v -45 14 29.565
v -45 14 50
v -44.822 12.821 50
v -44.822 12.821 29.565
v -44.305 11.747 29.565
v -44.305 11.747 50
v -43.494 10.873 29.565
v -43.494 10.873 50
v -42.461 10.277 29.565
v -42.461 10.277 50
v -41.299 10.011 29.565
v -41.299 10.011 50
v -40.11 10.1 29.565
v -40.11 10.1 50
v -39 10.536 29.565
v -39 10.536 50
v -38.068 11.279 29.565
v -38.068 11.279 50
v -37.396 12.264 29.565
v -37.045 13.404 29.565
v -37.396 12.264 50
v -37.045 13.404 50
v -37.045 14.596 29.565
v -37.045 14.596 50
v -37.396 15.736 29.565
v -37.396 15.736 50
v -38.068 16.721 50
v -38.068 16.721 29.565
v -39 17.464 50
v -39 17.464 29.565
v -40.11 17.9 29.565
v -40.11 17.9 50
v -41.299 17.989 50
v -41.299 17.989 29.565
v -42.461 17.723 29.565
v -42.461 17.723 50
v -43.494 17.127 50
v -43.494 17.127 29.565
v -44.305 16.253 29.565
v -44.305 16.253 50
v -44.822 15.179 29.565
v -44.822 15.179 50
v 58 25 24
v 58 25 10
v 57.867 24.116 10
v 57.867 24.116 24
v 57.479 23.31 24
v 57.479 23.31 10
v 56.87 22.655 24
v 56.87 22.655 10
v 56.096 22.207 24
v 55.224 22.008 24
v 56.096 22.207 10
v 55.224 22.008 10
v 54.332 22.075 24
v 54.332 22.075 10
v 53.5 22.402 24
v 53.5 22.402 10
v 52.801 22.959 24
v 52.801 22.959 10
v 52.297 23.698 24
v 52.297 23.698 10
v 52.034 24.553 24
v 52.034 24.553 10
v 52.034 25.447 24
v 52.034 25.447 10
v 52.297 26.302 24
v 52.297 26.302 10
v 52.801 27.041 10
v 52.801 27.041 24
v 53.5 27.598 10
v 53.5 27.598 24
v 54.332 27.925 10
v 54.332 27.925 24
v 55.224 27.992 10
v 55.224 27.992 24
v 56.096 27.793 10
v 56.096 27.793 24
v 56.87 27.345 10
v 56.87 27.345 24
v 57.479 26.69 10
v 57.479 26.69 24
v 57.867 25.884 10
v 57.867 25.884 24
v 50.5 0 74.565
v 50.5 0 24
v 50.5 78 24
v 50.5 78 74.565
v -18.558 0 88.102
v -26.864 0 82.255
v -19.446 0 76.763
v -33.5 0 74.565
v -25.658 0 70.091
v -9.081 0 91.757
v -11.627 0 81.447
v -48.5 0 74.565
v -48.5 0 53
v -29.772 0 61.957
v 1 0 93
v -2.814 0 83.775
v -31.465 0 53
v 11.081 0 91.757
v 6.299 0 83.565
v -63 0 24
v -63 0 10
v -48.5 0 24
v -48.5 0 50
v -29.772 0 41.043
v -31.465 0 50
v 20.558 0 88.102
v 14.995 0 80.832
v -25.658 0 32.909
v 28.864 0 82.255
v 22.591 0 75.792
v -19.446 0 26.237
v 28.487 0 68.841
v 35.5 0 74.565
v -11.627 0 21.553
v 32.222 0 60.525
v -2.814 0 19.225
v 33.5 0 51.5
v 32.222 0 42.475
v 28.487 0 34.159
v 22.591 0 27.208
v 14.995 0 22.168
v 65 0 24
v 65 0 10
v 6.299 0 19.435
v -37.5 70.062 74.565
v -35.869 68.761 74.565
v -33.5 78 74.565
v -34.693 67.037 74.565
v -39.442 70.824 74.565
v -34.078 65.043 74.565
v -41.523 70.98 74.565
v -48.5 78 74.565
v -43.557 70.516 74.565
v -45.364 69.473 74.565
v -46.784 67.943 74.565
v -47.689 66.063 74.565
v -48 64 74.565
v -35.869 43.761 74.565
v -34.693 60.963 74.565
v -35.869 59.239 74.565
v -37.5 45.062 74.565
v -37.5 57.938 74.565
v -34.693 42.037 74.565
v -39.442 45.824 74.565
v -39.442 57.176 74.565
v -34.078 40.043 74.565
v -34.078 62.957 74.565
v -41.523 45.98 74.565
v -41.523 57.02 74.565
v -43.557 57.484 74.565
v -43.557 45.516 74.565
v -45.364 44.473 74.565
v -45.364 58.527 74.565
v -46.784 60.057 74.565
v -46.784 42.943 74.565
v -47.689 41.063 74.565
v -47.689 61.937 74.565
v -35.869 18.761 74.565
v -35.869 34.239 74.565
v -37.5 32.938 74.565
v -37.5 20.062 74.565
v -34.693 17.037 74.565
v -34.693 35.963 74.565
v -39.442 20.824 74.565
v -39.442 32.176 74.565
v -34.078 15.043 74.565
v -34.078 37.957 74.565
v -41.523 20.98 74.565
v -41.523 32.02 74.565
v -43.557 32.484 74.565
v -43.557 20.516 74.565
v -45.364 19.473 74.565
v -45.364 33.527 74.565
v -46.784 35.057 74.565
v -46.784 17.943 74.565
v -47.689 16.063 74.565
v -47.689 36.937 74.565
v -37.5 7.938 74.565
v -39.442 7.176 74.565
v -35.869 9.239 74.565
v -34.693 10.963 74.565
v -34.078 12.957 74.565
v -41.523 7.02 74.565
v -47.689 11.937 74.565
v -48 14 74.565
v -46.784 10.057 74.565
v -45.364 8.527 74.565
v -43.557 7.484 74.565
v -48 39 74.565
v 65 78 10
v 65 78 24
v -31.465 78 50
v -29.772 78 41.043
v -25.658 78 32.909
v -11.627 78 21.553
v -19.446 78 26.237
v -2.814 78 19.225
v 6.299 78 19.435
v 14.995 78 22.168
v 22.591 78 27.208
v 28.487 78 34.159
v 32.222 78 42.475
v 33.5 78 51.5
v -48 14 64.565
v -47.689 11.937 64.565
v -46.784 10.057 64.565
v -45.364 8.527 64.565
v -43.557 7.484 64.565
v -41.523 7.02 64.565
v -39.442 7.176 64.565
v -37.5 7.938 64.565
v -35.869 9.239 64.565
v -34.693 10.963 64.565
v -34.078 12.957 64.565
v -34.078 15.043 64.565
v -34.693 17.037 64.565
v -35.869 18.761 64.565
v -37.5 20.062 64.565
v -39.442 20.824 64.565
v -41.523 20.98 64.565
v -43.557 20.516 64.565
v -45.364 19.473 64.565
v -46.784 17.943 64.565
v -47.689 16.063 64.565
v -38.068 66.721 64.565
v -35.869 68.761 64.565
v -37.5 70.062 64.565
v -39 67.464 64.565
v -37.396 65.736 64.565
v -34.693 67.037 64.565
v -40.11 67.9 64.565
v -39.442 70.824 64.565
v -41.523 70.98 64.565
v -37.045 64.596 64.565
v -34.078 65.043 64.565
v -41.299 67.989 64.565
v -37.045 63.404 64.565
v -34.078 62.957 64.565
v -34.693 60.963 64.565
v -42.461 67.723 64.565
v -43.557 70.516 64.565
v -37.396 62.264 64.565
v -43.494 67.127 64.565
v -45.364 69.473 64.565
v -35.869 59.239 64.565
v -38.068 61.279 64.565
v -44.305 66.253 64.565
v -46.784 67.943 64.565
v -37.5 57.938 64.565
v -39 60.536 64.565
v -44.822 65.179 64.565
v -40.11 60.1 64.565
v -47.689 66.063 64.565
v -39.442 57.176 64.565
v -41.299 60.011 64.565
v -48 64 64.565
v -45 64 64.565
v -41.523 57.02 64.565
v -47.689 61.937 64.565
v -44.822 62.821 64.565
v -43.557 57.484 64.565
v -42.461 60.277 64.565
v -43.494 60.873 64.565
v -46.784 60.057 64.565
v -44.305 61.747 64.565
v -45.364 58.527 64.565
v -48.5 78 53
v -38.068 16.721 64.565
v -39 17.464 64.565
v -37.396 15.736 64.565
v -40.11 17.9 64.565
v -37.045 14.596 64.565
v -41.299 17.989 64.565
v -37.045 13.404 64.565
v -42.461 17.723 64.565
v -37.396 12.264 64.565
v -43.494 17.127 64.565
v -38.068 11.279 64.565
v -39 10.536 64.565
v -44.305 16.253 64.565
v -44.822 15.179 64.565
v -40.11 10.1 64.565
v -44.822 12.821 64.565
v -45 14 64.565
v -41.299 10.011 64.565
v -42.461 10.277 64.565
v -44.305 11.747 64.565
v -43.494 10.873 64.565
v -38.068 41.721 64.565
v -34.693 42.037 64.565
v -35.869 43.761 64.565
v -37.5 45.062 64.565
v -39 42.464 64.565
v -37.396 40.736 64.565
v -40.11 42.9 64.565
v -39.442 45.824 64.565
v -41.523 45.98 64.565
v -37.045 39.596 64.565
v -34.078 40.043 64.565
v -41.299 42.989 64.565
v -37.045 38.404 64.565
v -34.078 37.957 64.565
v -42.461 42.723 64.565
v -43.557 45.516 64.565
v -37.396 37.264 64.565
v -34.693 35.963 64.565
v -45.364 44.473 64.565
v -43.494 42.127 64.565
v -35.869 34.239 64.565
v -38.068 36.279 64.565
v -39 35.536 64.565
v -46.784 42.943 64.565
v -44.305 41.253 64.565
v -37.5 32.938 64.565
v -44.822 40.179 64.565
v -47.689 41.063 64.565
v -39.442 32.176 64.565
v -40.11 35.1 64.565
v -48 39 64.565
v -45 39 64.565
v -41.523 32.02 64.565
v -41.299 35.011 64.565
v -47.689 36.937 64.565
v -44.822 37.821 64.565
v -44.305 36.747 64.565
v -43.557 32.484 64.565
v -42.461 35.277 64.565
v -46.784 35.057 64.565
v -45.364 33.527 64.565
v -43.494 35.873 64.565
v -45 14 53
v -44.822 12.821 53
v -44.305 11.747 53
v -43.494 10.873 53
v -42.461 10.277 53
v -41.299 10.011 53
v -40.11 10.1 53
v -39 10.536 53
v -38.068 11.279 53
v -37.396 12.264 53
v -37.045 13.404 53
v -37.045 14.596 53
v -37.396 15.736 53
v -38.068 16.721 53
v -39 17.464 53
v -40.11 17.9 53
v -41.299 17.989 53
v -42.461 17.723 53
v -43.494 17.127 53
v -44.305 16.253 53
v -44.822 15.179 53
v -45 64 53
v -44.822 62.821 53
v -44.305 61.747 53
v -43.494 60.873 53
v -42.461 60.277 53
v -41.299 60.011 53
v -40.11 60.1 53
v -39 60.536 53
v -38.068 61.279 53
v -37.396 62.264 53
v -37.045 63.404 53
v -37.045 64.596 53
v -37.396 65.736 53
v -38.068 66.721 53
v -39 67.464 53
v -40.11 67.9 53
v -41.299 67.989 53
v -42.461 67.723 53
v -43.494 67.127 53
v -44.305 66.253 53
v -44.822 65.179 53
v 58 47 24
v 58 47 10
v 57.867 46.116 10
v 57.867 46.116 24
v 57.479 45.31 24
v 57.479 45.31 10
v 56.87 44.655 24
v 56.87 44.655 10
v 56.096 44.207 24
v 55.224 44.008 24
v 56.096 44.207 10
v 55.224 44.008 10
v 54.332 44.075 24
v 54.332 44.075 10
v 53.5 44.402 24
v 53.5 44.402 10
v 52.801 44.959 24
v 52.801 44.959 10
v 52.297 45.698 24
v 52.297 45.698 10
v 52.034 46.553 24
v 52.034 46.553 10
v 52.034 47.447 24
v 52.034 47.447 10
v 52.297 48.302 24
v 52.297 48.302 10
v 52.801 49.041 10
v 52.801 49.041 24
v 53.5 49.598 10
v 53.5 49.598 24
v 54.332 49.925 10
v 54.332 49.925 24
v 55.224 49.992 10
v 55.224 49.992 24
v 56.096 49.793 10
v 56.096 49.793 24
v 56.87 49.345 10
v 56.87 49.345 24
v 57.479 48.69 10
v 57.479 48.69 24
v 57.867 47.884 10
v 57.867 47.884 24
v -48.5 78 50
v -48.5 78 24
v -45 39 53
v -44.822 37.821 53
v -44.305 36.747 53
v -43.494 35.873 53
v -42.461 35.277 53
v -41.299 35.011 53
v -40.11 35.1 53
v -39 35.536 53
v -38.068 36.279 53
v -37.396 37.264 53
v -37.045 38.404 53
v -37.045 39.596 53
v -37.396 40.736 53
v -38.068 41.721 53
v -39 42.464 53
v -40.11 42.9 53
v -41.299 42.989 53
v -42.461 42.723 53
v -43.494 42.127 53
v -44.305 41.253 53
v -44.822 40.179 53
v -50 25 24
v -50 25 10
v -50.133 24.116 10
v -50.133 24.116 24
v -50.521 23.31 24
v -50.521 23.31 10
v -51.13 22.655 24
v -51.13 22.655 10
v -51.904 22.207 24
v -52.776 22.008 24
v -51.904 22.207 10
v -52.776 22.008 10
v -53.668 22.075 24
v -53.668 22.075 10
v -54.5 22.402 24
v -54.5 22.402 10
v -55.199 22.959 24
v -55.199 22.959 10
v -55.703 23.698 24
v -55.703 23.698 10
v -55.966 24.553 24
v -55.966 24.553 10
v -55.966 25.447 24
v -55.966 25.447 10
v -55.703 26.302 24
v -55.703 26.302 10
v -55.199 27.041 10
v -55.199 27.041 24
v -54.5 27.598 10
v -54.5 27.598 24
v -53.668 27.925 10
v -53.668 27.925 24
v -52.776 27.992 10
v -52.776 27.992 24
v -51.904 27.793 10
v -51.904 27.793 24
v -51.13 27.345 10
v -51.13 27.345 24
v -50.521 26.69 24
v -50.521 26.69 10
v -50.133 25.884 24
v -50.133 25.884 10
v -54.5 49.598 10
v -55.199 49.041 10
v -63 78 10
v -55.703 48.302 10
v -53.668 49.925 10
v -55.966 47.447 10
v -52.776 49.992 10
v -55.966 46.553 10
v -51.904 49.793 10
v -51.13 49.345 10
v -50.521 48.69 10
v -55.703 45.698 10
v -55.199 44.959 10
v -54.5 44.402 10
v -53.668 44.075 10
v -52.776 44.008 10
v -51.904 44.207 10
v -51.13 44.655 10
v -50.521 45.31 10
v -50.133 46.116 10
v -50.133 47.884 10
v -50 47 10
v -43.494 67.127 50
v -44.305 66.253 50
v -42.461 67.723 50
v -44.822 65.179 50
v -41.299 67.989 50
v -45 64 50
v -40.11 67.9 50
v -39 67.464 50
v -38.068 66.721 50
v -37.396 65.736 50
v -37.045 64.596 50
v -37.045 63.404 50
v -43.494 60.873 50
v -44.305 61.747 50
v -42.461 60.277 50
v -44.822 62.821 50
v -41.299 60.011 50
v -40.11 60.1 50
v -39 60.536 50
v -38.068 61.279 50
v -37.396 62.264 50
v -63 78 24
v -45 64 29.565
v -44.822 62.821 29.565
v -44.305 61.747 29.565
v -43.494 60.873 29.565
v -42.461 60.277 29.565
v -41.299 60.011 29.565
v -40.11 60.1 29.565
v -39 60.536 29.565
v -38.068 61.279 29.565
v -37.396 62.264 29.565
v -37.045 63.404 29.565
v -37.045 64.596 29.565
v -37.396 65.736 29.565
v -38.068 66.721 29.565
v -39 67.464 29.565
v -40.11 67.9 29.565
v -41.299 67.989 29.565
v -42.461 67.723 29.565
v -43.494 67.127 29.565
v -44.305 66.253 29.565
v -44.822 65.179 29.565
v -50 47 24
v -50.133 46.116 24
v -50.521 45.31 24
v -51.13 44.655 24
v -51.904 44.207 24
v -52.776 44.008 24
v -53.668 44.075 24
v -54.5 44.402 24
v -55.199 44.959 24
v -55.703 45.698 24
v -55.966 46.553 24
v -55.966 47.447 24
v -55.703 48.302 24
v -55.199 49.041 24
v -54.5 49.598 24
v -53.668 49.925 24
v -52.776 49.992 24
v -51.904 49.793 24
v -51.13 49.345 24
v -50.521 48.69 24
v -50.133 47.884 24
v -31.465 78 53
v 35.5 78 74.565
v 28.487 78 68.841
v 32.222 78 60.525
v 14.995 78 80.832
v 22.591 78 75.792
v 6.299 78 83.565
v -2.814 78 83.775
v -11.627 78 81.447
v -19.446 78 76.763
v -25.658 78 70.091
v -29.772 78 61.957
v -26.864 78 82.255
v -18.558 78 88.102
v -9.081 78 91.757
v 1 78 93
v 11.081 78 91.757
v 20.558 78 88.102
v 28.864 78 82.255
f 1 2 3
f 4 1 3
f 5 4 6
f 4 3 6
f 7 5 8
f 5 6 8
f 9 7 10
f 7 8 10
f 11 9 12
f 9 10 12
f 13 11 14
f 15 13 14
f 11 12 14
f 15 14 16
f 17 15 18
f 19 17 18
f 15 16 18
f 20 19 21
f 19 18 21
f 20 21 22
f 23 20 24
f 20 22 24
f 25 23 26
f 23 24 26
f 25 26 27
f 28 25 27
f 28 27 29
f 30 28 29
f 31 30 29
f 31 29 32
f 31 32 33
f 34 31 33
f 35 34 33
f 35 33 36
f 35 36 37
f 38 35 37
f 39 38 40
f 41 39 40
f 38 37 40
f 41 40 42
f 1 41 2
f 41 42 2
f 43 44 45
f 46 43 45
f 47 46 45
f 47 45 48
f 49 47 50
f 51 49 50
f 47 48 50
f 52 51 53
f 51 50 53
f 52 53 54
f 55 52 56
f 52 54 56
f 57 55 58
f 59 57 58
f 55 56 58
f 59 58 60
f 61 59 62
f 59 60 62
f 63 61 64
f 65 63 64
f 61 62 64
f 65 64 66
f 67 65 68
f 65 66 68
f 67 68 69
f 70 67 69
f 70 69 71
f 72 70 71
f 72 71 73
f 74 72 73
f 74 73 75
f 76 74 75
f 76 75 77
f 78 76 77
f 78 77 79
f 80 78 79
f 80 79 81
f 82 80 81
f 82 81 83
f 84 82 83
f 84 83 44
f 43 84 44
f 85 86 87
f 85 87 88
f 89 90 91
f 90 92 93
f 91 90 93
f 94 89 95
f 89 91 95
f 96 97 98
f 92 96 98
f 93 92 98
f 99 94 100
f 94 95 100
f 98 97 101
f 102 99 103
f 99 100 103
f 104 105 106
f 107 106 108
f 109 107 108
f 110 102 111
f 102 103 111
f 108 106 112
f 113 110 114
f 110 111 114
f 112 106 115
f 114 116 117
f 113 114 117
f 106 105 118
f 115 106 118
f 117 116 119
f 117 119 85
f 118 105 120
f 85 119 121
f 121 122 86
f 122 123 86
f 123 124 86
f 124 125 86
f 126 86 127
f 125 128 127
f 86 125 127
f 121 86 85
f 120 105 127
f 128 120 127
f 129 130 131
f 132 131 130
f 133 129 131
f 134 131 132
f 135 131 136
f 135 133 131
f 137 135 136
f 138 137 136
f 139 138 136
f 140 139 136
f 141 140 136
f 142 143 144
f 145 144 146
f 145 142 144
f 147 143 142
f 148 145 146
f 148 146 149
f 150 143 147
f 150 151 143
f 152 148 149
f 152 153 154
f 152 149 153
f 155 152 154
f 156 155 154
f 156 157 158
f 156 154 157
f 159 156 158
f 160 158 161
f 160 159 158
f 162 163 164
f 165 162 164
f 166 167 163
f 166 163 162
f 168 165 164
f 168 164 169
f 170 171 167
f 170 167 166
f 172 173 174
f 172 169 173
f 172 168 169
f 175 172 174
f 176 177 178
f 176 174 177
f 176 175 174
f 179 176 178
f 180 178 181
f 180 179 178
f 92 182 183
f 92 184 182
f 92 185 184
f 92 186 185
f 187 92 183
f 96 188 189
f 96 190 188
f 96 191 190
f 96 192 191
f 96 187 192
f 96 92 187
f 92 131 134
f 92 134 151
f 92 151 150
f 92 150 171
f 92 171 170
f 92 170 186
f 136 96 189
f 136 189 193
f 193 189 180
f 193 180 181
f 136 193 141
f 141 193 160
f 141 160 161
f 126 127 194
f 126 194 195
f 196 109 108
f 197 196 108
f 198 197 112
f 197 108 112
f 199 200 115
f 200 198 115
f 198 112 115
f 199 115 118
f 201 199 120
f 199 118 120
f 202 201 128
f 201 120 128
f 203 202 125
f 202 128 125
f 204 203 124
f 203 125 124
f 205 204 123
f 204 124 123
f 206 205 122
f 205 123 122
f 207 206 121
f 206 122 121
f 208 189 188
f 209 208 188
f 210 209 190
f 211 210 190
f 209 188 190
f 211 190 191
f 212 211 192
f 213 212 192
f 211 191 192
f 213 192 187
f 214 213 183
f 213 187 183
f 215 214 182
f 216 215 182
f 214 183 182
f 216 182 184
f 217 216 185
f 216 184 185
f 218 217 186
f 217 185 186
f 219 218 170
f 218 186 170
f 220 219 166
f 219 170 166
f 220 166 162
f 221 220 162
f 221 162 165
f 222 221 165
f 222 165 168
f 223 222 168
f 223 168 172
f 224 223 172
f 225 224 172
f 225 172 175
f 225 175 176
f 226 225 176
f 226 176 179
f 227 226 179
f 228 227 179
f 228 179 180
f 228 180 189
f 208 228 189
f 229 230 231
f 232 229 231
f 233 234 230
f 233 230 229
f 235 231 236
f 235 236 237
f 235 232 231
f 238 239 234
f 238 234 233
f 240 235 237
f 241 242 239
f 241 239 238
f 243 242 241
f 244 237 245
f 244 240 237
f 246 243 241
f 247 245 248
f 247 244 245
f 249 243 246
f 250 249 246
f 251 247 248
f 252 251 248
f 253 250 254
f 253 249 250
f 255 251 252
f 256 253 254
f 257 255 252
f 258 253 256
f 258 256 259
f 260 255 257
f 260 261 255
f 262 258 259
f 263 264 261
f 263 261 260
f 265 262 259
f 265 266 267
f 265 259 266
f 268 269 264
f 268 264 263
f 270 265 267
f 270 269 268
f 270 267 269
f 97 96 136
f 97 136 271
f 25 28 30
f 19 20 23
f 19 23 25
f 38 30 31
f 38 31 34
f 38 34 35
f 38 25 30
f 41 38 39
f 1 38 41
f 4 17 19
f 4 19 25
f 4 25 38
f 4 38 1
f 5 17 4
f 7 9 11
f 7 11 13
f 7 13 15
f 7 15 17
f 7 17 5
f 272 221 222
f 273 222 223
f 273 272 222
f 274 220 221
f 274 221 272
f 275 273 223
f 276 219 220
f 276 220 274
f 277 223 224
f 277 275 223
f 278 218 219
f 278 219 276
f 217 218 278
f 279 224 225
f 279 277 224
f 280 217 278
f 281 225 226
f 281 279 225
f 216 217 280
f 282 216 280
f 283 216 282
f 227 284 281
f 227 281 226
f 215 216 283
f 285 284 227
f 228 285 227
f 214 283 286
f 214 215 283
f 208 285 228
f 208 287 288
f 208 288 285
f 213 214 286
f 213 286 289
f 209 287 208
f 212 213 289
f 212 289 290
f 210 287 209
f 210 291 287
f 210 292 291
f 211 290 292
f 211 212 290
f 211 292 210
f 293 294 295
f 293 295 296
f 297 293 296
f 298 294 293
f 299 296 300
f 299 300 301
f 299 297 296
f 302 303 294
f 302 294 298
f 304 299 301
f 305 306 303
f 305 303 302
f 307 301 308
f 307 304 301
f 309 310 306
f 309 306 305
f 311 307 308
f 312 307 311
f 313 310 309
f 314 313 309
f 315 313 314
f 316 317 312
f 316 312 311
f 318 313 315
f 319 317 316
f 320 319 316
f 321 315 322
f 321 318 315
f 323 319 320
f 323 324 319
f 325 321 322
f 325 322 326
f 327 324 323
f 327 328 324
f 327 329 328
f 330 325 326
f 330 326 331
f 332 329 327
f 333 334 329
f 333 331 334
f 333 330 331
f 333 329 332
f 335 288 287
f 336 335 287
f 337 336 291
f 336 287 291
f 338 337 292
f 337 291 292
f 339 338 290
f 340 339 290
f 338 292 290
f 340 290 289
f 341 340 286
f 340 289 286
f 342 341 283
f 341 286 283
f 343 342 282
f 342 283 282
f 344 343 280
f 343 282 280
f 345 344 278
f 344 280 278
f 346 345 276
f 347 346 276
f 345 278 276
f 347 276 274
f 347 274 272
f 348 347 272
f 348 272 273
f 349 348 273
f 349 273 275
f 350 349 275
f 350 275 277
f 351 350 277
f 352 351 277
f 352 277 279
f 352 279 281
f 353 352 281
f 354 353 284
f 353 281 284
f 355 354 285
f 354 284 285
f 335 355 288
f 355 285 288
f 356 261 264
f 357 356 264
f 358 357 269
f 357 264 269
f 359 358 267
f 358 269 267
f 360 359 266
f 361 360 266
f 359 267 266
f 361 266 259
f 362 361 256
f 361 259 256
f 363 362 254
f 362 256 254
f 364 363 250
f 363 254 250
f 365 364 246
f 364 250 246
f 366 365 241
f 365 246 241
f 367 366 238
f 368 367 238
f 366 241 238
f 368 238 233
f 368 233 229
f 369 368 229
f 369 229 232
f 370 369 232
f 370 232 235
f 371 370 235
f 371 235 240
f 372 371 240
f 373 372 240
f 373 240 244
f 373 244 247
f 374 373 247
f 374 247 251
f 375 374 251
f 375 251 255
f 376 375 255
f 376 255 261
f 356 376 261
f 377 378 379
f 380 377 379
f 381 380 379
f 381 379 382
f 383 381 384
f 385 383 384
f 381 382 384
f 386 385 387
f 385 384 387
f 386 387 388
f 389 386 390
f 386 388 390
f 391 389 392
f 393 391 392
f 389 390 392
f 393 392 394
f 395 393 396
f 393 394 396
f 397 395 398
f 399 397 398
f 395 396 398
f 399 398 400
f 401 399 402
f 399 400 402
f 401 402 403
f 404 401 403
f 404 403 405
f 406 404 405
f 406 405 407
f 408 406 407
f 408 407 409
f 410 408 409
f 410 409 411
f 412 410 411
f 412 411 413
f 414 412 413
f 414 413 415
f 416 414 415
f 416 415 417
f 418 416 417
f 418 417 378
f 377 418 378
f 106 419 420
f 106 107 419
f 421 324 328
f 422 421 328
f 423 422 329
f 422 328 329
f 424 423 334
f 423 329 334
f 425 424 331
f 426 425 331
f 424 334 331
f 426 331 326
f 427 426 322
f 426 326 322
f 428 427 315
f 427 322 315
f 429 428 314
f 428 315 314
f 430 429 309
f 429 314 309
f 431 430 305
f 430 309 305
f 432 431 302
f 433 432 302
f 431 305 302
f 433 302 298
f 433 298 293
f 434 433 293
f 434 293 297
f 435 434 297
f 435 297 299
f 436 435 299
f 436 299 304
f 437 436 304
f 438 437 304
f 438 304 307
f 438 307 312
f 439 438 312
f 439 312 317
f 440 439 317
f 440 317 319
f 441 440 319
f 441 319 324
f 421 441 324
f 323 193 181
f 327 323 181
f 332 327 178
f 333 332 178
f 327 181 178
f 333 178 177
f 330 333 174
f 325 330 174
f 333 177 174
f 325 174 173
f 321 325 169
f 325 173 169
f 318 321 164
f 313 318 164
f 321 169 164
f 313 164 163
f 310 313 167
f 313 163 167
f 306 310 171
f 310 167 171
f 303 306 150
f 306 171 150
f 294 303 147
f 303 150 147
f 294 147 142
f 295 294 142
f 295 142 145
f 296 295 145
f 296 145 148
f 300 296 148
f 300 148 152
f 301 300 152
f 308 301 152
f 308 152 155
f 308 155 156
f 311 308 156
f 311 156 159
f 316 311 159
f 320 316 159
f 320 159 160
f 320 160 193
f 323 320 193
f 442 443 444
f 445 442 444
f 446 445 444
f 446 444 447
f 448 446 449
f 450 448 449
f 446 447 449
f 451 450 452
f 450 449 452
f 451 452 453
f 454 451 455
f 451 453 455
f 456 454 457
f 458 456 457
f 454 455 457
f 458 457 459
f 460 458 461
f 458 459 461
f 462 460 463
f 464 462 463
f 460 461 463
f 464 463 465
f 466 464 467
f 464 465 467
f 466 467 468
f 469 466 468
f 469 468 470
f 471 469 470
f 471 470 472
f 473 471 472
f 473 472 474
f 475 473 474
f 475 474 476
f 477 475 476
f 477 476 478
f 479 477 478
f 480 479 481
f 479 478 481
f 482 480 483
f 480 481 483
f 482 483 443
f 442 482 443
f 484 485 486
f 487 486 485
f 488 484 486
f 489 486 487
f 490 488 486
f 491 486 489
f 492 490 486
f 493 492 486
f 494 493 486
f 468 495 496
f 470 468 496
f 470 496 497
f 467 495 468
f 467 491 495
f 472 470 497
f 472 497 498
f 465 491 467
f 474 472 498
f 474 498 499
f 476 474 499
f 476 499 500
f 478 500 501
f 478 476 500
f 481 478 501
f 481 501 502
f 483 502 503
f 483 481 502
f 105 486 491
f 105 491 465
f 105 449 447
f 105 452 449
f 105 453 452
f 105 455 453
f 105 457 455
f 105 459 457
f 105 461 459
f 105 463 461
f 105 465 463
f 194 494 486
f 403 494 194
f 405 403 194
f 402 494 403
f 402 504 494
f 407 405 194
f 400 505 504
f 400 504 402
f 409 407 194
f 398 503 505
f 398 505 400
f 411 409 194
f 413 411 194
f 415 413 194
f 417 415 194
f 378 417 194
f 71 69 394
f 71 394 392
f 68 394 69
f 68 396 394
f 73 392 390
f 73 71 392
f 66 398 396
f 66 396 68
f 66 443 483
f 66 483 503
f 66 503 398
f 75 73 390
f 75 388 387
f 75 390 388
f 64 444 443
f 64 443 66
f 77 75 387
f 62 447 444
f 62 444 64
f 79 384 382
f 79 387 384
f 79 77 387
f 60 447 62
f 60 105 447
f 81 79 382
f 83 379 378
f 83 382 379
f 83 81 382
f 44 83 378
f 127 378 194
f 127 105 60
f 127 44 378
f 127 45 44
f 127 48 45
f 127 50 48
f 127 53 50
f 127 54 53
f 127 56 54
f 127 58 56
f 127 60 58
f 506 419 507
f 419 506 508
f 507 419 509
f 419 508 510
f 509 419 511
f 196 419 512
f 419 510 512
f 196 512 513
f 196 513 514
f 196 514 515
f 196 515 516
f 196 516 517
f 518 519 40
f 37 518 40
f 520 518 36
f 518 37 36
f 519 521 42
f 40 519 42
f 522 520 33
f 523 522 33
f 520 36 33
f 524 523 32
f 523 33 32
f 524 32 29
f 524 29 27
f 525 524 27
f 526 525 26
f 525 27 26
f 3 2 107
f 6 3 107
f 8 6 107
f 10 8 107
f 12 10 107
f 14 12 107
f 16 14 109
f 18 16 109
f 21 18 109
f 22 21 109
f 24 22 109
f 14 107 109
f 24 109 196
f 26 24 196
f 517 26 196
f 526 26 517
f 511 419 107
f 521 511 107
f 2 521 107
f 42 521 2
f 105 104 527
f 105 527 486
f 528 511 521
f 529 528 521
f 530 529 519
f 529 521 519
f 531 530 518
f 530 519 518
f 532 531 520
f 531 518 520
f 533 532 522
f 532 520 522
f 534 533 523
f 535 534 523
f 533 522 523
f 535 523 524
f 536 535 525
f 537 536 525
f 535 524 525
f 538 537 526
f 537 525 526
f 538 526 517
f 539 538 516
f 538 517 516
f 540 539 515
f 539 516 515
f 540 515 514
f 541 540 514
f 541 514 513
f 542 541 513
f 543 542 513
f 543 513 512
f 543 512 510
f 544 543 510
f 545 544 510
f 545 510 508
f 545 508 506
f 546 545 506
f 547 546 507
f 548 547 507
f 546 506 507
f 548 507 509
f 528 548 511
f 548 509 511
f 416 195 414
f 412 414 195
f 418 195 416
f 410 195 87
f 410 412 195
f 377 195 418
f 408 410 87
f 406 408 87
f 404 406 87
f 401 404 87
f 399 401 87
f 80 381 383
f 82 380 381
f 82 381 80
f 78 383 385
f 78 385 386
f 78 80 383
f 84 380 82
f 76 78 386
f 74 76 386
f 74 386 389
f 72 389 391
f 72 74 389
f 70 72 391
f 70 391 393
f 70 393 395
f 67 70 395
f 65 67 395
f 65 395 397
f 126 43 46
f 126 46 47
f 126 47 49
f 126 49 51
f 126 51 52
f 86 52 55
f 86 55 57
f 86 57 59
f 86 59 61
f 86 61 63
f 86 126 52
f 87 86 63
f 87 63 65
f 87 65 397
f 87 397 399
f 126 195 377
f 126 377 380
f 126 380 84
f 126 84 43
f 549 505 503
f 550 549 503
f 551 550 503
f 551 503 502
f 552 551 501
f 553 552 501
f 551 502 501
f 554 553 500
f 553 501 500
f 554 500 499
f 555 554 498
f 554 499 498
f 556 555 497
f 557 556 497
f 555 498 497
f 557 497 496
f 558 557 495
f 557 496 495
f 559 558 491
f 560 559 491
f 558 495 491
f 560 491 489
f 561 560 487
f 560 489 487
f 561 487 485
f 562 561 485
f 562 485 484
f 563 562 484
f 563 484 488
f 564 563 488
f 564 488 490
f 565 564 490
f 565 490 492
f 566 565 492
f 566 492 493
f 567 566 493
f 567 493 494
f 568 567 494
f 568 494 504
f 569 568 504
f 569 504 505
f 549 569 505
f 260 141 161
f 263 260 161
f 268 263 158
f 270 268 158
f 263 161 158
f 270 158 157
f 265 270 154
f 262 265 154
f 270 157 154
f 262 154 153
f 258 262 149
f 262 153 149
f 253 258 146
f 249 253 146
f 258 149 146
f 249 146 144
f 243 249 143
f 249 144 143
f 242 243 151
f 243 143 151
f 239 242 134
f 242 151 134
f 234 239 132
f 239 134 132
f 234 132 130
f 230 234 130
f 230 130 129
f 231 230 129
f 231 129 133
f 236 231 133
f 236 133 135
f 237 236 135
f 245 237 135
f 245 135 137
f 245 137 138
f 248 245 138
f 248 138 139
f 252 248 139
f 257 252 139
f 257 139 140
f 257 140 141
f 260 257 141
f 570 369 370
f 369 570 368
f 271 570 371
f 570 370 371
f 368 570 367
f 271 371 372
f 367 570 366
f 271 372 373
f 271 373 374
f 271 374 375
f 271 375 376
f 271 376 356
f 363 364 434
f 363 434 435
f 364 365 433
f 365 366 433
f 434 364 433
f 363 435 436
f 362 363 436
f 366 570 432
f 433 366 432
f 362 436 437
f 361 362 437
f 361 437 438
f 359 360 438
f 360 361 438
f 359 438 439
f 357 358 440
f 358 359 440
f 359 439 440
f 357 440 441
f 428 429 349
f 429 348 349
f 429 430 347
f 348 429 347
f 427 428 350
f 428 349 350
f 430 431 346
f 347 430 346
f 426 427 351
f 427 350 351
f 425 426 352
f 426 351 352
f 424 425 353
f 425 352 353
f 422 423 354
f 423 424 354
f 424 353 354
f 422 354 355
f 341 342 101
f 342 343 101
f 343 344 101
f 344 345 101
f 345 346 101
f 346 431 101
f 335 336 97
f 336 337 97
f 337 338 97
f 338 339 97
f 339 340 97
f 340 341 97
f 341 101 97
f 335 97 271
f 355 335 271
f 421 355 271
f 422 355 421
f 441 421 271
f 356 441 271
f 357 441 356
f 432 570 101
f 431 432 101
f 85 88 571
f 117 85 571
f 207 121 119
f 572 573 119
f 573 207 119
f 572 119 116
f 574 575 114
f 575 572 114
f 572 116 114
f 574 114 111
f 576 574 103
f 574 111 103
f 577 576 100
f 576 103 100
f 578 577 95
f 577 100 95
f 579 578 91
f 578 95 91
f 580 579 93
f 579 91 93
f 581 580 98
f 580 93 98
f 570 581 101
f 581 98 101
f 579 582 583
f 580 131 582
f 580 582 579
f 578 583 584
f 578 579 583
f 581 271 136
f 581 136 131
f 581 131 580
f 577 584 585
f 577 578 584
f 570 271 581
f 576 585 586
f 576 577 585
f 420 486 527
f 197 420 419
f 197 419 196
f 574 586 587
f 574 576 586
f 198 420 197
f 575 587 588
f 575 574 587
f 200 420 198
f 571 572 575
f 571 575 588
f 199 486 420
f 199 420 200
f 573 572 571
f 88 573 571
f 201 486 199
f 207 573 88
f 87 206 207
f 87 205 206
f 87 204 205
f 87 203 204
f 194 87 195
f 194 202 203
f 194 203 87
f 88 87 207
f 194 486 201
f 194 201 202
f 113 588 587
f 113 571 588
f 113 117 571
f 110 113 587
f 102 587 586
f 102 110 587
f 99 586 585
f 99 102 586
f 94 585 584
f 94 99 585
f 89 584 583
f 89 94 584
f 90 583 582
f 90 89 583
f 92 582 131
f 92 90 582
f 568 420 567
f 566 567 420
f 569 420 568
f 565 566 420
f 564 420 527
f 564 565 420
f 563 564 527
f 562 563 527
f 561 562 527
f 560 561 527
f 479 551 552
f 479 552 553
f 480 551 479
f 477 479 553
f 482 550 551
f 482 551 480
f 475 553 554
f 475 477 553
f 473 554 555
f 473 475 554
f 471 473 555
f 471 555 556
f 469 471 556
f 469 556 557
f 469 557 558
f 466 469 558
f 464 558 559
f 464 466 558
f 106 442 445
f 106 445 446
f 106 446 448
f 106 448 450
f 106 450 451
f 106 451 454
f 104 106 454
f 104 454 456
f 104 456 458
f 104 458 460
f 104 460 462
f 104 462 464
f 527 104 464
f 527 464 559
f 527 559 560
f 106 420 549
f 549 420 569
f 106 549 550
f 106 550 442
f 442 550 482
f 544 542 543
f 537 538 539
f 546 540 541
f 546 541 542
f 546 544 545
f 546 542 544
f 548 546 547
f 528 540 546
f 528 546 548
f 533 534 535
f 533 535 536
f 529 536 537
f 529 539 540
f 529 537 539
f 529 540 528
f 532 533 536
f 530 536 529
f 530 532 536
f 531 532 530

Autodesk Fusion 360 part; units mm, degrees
sketch "Front" plane through (0, 0, 0) normal (0, 1, 0) x (1, 0, 0)
  line L0 (-75, -10) -> (75, -10) construction
  line L1 (-75, -24) -> (75, -24) construction
  line L2 (-75, -74.5651) -> (75, -74.5651) construction
  line L3 (-74, -51.5) -> (76, -51.5) construction
  circle A0 centre (1, -51.5) radius 32.5
  circle A1 centre (1, -51.5) radius 41.5
  line L4 (-48.5, 10) -> (-48.5, -85) construction
  line L5 (50.5, 10) -> (50.5, -85) construction
  line L6 (65, 10) -> (65, -25) construction
  line L7 (-63, 10) -> (-63, -25) construction
  line L8 (-33.5, -74.5651) -> (-48.5, -74.5651)
  line L9 (-48.5, -74.5651) -> (-48.5, -24)
  line L10 (-48.5, -24) -> (-63, -24)
  line L11 (-63, -24) -> (-63, -10)
  line L12 (-63, -10) -> (65, -10)
  line L13 (65, -10) -> (65, -24)
  line L14 (65, -24) -> (50.5, -24)
  line L15 (50.5, -24) -> (50.5, -74.5651)
  line L16 (50.5, -74.5651) -> (35.5, -74.5651)
  line L17 (-30, -53) -> (-51, -53)
  line L18 (-51, -53) -> (-51, -50)
  line L19 (-51, -50) -> (-30, -50)
  line L20 (-30, -50) -> (-30, -53)
  line L21 (-30, -53) -> (-51, -50) construction
  line L22 (-51, -53) -> (-30, -50) construction
  point P0 (-33.5, -74.5651)
  point P1 (35.5, -74.5651)
  point P2 (0.9773, -10)
  point P3 (-40.5, -51.5)
  dimension "d1" = 14
  dimension "d2" = 65
  dimension "d3" = 83
  dimension "d4" = 49.5
  dimension "d5" = 49.5
  dimension "d6" = 64
  dimension "d7" = 64
  dimension "d8" = 15
  dimension "d9" = 15
  dimension "d10" = 23.0651
  dimension "d14" = 14.5
  dimension "d15" = 3
extrude "Extrude1" add sketch "Front" along normal blind 78 contours A0 A1 L17 L19 | A1 L9 L10 L11 L12 L19 | A1 L8 L9 L17 | A1 L12 L13 L14 L15 L16 picked at (34.7953, -69.7412)
sketch "Top holes" plane through (0, 0, 74.5651) normal (0, 0, 1) x (-1, 0, 0)
  line L0 (48.5, 0) -> (33.5, 0)
  line L1 (33.5, 0) -> (33.5, -78)
  line L2 (33.5, -78) -> (48.5, -78)
  line L3 (48.5, -78) -> (48.5, 0)
  line L4 (41, -78) -> (41, 0) construction
  circle A0 centre (41, -39) radius 7
  circle A1 centre (41, -64) radius 7
  circle A2 centre (41, -14) radius 7
  circle A3 centre (41, -39) radius 4
  circle A4 centre (41, -64) radius 4
  circle A5 centre (41, -14) radius 4
  dimension "d18" = 14
  dimension "d19" = 14
  dimension "d20" = 14
  dimension "d21" = 25
  dimension "d22" = 25
  dimension "d23" = 8
  dimension "d24" = 8
  dimension "d25" = 8
extrude "Extrude2" cut sketch "Top holes" against normal blind 45 contours A4 | A5
extrude "Extrude5" cut sketch "Top holes" against normal blind 23 contours A3
extrude "Extrude3" cut sketch "Top holes" against normal blind 10 contours A0 | A1 | A2
sketch "Bottom holes" plane through (0, 0, 10) normal (0, 0, -1) x (1, 0, 0)
  line L0 (65, 0) -> (-63, 0)
  line L1 (-63, -78) -> (65, -78)
  line L2 (65, -78) -> (65, 0)
  line L3 (1, -78) -> (1, 0) construction
  line L4 (55, -47) -> (-53, -47) construction
  line L5 (-53, -47) -> (-53, -25) construction
  line L6 (-53, -25) -> (55, -25) construction
  line L7 (55, -25) -> (55, -47) construction
  line L8 (55, -47) -> (-53, -25) construction
  line L9 (-53, -47) -> (55, -25) construction
  circle A0 centre (-53, -25) radius 3
  circle A1 centre (-53, -47) radius 3
  circle A2 centre (55, -47) radius 3
  circle A3 centre (55, -25) radius 3
  line L10 (-63, 0) -> (-63, -78)
  point P0 (1, -36)
  dimension "d38" = 108
  dimension "d39" = 22
  dimension "d40" = 25
  dimension "d41" = 6
  dimension "d42" = 6
  dimension "d43" = 6
  dimension "d44" = 6
extrude "Extrude4" cut sketch "Bottom holes" against normal through all contours A0 | A1 | A2 | A3
equation "d3 = d2 + 18 mm"
equation "d4 = ( 99 / 2 ) * 1 mm"
equation "d5 = d4"
equation "d7 = d6"
equation "d19 = d18"
equation "d20 = d18"
equation "d22 = d21"
equation "d24 = d23"
equation "d25 = d23"
equation "d42 = d41"
equation "d43 = d41"
equation "d44 = d41"
